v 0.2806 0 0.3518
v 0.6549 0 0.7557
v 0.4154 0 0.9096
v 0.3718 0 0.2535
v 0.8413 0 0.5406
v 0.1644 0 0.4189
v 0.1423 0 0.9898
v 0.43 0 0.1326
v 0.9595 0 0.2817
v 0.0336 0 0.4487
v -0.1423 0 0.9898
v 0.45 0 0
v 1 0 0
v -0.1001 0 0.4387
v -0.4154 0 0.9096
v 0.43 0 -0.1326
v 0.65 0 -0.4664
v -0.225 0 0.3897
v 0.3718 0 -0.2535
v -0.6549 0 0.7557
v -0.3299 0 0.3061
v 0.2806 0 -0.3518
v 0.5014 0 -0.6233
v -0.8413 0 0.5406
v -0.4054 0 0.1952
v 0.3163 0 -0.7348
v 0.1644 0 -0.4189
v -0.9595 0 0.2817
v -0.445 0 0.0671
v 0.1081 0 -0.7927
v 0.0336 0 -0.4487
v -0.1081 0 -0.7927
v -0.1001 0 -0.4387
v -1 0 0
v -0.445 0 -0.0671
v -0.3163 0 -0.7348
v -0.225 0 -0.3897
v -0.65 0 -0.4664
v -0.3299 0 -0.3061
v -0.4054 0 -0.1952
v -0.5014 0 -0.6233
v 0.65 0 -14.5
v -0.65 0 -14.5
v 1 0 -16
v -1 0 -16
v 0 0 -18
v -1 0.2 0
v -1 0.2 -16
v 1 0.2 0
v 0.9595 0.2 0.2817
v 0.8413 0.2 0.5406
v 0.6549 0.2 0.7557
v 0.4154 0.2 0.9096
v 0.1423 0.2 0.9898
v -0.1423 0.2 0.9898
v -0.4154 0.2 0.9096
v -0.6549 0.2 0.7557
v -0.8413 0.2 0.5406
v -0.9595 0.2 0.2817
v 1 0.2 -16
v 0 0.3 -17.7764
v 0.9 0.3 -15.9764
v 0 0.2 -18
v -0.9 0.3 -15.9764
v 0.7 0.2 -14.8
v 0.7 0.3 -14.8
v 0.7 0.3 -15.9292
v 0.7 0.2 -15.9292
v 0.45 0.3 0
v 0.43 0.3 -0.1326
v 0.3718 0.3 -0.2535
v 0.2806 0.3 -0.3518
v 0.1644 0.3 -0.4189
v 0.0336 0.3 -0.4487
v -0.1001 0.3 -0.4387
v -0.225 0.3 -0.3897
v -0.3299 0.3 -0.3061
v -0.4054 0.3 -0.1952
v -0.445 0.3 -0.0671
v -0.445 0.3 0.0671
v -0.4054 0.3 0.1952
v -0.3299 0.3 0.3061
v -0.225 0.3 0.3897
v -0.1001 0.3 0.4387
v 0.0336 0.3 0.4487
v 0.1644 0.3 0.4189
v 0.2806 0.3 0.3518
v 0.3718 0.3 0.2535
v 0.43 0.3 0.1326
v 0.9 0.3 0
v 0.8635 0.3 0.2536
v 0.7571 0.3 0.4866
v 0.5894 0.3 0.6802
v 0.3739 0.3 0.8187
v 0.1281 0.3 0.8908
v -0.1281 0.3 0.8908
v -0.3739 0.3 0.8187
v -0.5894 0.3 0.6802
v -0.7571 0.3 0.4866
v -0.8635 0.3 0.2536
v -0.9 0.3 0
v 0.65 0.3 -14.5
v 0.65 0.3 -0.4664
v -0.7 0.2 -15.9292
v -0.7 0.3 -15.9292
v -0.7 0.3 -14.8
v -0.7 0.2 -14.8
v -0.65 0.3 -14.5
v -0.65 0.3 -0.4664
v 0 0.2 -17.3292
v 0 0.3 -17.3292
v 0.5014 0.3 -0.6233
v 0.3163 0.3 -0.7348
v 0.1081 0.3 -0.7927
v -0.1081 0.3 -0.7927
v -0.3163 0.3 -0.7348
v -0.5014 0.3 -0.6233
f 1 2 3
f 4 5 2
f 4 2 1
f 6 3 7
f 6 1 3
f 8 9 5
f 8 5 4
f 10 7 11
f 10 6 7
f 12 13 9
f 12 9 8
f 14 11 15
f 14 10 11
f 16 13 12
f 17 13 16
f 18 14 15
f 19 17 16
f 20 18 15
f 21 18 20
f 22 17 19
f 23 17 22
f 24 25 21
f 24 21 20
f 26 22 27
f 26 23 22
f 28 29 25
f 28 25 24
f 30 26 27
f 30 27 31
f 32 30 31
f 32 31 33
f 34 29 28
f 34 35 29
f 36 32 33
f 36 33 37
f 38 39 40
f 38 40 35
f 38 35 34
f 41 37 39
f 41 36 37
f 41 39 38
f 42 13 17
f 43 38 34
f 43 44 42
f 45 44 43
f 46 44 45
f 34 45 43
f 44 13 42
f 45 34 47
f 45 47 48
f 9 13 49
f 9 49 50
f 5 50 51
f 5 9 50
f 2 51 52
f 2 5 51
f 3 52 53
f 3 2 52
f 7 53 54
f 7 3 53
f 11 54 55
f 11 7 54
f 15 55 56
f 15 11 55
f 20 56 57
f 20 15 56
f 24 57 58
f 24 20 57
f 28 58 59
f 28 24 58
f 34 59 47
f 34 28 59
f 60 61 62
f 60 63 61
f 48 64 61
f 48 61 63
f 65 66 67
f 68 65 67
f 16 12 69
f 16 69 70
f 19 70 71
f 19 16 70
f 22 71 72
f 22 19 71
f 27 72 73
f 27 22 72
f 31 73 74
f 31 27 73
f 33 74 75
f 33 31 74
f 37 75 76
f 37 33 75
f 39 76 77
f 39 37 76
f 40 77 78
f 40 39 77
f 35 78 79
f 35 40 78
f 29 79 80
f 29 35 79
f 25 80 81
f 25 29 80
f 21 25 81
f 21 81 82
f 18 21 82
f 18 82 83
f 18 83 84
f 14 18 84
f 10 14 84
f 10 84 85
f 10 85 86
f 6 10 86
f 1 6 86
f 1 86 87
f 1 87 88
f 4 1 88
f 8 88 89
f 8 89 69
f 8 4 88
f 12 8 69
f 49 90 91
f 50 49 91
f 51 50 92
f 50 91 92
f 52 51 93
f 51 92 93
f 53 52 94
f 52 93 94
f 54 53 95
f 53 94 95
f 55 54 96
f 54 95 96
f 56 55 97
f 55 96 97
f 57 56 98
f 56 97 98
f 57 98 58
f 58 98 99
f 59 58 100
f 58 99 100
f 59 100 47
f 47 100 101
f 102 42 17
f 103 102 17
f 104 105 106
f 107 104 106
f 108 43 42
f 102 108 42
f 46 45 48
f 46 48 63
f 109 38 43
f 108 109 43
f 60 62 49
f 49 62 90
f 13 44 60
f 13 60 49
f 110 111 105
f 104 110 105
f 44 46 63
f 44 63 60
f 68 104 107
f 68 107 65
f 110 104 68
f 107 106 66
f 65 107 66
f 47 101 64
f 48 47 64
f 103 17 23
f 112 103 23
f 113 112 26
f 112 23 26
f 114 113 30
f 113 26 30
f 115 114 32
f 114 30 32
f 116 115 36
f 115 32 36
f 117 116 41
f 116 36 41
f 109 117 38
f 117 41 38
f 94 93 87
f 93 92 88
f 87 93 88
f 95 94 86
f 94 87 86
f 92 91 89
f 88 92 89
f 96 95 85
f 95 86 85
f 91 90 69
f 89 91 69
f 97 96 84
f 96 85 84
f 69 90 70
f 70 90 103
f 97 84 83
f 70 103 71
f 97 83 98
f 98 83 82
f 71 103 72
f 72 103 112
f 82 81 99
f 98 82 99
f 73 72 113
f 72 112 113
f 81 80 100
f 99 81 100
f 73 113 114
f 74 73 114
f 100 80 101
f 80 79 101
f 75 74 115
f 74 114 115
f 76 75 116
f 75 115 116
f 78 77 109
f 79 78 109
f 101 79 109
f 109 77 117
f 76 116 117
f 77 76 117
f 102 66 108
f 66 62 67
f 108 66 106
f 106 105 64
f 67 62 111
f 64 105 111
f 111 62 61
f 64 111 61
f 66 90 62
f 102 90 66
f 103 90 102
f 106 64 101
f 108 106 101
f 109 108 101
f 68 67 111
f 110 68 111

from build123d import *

# Parameters (mm, degrees)
SKETCH1_R           = 0.45
BOSS_EXTRUDE1_DEPTH = 0.3
CUT_EXTRUDE1_DEPTH  = 0.1
CHAMFER1_SIZE       = 0.1


with BuildPart() as part:
    # Sketch1 → Boss-Extrude1 (new body)
    with BuildSketch(Plane(origin=(0, 0, 0), x_dir=(1, 0, 0), z_dir=(0, 1, 0))):
        with BuildLine():
            Line((-1, 0), (-1, 16))
            Line((-1, 16), (0, 18))
            Line((0, 18), (1, 16))
            Line((1, 16), (1, 0))
            ThreePointArc((1, 0), (0, -1), (-1, 0))
        make_face()
        Circle(SKETCH1_R, mode=Mode.SUBTRACT)
        with BuildLine():
            Line((-0.65, 0.466368953), (-0.65, 14.5))
            Line((-0.65, 14.5), (0.65, 14.5))
            Line((0.65, 14.5), (0.65, 0.466368953))
            ThreePointArc((0.65, 0.466368953), (0, 0.8), (-0.65, 0.466368953))
        make_face(mode=Mode.SUBTRACT)
    extrude(amount=BOSS_EXTRUDE1_DEPTH)

    # Sketch2 → Cut-Extrude1 (cut)
    with BuildSketch(Plane(origin=(0, 0.3, 0), x_dir=(1, 0, 0), z_dir=(0, 1, 0))):
        Polygon((-0.7, 15.929179607), (-0.7, 14.8), (0.7, 14.8), (0.7, 15.929179607), (0, 17.329179607), align=None)
    extrude(amount=-CUT_EXTRUDE1_DEPTH, mode=Mode.SUBTRACT)

    # Chamfer1
    chamfer1_edges = [part.edges().sort_by_distance(p)[0] for p in [
        (0.5, 0.3, -17),
        (-0.5, 0.3, -17),
        (-1, 0.3, -8),
        (0, 0.3, 1),
        (1, 0.3, -8),
    ]]
    chamfer(chamfer1_edges, length=CHAMFER1_SIZE)


solid = part.part
